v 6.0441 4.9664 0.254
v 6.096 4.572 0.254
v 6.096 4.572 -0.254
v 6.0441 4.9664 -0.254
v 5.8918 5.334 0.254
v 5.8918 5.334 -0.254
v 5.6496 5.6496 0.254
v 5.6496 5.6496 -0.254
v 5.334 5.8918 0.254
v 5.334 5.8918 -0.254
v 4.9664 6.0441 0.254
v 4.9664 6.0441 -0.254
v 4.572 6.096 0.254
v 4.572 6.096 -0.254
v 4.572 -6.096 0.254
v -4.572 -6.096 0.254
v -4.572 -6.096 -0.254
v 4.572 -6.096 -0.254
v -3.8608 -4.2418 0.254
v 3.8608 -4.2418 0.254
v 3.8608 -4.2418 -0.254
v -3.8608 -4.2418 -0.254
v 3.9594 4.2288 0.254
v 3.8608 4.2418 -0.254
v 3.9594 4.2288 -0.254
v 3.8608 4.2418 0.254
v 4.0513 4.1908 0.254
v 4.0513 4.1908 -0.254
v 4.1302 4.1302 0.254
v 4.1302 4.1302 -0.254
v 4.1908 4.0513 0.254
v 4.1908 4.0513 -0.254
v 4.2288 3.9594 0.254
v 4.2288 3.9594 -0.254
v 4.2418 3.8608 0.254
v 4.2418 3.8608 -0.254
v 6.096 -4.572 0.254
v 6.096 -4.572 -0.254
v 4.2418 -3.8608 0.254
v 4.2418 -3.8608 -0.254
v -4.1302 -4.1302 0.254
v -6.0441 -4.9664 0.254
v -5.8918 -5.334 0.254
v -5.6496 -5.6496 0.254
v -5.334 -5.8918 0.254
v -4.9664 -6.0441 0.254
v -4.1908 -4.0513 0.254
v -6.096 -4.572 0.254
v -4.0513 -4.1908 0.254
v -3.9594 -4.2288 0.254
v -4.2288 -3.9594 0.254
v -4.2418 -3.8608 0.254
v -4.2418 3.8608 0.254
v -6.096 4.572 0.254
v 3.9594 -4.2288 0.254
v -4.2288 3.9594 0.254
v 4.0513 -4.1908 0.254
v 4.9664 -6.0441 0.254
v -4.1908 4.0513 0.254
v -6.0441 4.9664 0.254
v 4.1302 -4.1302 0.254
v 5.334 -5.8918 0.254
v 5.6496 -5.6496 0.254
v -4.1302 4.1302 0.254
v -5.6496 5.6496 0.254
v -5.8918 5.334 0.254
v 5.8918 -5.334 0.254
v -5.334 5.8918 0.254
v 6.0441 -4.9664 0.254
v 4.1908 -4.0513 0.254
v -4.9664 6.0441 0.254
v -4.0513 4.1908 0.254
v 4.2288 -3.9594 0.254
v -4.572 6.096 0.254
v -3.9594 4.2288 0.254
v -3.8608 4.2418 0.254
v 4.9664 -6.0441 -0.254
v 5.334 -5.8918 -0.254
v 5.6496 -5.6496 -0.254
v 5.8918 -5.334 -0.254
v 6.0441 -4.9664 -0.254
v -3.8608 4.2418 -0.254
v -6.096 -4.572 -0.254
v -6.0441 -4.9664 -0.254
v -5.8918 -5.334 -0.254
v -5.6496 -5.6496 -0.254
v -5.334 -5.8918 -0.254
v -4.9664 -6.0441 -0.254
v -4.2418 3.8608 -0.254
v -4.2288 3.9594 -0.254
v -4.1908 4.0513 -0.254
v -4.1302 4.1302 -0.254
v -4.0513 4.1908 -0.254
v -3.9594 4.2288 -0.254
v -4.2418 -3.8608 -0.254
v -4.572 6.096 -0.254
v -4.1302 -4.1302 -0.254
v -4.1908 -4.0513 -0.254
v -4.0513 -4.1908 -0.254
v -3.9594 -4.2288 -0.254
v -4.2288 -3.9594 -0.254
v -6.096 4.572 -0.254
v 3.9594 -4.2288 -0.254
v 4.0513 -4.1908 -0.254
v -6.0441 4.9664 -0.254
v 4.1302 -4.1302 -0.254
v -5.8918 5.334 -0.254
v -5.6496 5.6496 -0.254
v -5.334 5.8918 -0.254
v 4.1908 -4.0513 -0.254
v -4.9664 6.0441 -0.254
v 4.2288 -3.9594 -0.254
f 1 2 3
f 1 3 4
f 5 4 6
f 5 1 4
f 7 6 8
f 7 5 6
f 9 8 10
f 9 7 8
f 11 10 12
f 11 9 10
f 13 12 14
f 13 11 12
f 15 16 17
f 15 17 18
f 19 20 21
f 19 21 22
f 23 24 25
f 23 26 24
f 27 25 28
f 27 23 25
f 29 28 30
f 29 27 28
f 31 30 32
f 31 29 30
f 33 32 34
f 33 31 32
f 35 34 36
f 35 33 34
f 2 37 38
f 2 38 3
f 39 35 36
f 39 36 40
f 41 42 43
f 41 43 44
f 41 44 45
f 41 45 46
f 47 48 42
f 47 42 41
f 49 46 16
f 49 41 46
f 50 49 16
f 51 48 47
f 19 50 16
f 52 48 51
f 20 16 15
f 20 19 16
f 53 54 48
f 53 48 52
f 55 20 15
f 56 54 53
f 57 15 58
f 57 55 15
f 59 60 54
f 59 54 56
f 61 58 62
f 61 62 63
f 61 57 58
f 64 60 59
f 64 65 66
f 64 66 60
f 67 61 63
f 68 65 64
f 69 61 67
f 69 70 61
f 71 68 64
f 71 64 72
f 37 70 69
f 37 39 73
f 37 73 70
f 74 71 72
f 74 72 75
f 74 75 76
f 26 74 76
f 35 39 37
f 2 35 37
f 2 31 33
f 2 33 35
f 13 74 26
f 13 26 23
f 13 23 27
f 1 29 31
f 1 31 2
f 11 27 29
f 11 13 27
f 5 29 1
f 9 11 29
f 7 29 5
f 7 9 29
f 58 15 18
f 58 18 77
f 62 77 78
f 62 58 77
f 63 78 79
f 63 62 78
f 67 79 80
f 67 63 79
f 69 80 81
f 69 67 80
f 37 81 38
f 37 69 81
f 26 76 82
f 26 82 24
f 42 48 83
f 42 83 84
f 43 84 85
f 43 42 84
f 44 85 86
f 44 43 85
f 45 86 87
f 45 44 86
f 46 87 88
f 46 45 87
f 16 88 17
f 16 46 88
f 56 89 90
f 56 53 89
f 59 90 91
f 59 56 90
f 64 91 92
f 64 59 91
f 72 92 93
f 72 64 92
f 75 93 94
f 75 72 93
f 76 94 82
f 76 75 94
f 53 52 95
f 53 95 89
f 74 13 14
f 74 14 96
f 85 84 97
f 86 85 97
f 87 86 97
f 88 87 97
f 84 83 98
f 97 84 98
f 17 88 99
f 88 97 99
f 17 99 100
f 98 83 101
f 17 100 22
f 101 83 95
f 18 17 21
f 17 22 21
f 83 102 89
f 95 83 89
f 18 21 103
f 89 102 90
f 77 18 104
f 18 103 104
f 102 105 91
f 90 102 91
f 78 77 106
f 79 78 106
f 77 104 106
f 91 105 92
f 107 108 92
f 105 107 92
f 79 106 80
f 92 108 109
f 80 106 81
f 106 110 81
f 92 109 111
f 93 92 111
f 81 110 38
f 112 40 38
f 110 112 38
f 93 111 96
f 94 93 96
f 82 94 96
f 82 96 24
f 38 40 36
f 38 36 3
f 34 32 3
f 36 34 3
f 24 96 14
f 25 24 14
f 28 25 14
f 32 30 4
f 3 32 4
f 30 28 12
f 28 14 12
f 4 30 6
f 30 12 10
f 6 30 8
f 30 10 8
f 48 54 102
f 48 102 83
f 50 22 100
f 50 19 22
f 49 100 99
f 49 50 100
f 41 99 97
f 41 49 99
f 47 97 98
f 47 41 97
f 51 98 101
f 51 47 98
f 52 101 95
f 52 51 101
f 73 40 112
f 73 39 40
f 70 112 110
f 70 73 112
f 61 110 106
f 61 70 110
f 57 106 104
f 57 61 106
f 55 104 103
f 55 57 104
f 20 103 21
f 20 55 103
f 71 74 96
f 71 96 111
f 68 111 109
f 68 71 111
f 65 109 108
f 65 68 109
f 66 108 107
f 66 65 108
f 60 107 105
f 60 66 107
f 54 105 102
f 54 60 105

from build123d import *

# Parameters (mm, degrees)
BOSS_EXTRUDE1_DEPTH = 0.254
CIRPATTERN2_COUNT   = 4


with BuildPart() as part:
    # Sketch3 → Boss-Extrude1 (new, symmetric)
    with BuildSketch(Plane.XY):
        with BuildLine():
            Line((4.2418, 0.762), (6.096, 0.762))
            Line((6.096, 0.762), (6.096, 4.572))
            ThreePointArc((6.096, 4.572), (5.649630735, 5.649630735), (4.572, 6.096))
            Line((4.572, 6.096), (-0.889, 6.096))
            Line((-0.889, 6.096), (-0.889, 4.2418))
            Line((-0.889, 4.2418), (3.8608, 4.2418))
            ThreePointArc((3.8608, 4.2418), (4.130207684, 4.130207684), (4.2418, 3.8608))
            Line((4.2418, 3.8608), (4.2418, 0.762))
        make_face()
    boss_extrude1 = extrude(amount=BOSS_EXTRUDE1_DEPTH, both=True)

    # CirPattern2: Boss-Extrude1 ×4 about axis
    cirpattern2_axis = Axis((0, 0, -69.733664692), (0, 0, 1))
    for i in range(1, CIRPATTERN2_COUNT):
        add(boss_extrude1.rotate(cirpattern2_axis, i * 360 / CIRPATTERN2_COUNT))


solid = part.part
